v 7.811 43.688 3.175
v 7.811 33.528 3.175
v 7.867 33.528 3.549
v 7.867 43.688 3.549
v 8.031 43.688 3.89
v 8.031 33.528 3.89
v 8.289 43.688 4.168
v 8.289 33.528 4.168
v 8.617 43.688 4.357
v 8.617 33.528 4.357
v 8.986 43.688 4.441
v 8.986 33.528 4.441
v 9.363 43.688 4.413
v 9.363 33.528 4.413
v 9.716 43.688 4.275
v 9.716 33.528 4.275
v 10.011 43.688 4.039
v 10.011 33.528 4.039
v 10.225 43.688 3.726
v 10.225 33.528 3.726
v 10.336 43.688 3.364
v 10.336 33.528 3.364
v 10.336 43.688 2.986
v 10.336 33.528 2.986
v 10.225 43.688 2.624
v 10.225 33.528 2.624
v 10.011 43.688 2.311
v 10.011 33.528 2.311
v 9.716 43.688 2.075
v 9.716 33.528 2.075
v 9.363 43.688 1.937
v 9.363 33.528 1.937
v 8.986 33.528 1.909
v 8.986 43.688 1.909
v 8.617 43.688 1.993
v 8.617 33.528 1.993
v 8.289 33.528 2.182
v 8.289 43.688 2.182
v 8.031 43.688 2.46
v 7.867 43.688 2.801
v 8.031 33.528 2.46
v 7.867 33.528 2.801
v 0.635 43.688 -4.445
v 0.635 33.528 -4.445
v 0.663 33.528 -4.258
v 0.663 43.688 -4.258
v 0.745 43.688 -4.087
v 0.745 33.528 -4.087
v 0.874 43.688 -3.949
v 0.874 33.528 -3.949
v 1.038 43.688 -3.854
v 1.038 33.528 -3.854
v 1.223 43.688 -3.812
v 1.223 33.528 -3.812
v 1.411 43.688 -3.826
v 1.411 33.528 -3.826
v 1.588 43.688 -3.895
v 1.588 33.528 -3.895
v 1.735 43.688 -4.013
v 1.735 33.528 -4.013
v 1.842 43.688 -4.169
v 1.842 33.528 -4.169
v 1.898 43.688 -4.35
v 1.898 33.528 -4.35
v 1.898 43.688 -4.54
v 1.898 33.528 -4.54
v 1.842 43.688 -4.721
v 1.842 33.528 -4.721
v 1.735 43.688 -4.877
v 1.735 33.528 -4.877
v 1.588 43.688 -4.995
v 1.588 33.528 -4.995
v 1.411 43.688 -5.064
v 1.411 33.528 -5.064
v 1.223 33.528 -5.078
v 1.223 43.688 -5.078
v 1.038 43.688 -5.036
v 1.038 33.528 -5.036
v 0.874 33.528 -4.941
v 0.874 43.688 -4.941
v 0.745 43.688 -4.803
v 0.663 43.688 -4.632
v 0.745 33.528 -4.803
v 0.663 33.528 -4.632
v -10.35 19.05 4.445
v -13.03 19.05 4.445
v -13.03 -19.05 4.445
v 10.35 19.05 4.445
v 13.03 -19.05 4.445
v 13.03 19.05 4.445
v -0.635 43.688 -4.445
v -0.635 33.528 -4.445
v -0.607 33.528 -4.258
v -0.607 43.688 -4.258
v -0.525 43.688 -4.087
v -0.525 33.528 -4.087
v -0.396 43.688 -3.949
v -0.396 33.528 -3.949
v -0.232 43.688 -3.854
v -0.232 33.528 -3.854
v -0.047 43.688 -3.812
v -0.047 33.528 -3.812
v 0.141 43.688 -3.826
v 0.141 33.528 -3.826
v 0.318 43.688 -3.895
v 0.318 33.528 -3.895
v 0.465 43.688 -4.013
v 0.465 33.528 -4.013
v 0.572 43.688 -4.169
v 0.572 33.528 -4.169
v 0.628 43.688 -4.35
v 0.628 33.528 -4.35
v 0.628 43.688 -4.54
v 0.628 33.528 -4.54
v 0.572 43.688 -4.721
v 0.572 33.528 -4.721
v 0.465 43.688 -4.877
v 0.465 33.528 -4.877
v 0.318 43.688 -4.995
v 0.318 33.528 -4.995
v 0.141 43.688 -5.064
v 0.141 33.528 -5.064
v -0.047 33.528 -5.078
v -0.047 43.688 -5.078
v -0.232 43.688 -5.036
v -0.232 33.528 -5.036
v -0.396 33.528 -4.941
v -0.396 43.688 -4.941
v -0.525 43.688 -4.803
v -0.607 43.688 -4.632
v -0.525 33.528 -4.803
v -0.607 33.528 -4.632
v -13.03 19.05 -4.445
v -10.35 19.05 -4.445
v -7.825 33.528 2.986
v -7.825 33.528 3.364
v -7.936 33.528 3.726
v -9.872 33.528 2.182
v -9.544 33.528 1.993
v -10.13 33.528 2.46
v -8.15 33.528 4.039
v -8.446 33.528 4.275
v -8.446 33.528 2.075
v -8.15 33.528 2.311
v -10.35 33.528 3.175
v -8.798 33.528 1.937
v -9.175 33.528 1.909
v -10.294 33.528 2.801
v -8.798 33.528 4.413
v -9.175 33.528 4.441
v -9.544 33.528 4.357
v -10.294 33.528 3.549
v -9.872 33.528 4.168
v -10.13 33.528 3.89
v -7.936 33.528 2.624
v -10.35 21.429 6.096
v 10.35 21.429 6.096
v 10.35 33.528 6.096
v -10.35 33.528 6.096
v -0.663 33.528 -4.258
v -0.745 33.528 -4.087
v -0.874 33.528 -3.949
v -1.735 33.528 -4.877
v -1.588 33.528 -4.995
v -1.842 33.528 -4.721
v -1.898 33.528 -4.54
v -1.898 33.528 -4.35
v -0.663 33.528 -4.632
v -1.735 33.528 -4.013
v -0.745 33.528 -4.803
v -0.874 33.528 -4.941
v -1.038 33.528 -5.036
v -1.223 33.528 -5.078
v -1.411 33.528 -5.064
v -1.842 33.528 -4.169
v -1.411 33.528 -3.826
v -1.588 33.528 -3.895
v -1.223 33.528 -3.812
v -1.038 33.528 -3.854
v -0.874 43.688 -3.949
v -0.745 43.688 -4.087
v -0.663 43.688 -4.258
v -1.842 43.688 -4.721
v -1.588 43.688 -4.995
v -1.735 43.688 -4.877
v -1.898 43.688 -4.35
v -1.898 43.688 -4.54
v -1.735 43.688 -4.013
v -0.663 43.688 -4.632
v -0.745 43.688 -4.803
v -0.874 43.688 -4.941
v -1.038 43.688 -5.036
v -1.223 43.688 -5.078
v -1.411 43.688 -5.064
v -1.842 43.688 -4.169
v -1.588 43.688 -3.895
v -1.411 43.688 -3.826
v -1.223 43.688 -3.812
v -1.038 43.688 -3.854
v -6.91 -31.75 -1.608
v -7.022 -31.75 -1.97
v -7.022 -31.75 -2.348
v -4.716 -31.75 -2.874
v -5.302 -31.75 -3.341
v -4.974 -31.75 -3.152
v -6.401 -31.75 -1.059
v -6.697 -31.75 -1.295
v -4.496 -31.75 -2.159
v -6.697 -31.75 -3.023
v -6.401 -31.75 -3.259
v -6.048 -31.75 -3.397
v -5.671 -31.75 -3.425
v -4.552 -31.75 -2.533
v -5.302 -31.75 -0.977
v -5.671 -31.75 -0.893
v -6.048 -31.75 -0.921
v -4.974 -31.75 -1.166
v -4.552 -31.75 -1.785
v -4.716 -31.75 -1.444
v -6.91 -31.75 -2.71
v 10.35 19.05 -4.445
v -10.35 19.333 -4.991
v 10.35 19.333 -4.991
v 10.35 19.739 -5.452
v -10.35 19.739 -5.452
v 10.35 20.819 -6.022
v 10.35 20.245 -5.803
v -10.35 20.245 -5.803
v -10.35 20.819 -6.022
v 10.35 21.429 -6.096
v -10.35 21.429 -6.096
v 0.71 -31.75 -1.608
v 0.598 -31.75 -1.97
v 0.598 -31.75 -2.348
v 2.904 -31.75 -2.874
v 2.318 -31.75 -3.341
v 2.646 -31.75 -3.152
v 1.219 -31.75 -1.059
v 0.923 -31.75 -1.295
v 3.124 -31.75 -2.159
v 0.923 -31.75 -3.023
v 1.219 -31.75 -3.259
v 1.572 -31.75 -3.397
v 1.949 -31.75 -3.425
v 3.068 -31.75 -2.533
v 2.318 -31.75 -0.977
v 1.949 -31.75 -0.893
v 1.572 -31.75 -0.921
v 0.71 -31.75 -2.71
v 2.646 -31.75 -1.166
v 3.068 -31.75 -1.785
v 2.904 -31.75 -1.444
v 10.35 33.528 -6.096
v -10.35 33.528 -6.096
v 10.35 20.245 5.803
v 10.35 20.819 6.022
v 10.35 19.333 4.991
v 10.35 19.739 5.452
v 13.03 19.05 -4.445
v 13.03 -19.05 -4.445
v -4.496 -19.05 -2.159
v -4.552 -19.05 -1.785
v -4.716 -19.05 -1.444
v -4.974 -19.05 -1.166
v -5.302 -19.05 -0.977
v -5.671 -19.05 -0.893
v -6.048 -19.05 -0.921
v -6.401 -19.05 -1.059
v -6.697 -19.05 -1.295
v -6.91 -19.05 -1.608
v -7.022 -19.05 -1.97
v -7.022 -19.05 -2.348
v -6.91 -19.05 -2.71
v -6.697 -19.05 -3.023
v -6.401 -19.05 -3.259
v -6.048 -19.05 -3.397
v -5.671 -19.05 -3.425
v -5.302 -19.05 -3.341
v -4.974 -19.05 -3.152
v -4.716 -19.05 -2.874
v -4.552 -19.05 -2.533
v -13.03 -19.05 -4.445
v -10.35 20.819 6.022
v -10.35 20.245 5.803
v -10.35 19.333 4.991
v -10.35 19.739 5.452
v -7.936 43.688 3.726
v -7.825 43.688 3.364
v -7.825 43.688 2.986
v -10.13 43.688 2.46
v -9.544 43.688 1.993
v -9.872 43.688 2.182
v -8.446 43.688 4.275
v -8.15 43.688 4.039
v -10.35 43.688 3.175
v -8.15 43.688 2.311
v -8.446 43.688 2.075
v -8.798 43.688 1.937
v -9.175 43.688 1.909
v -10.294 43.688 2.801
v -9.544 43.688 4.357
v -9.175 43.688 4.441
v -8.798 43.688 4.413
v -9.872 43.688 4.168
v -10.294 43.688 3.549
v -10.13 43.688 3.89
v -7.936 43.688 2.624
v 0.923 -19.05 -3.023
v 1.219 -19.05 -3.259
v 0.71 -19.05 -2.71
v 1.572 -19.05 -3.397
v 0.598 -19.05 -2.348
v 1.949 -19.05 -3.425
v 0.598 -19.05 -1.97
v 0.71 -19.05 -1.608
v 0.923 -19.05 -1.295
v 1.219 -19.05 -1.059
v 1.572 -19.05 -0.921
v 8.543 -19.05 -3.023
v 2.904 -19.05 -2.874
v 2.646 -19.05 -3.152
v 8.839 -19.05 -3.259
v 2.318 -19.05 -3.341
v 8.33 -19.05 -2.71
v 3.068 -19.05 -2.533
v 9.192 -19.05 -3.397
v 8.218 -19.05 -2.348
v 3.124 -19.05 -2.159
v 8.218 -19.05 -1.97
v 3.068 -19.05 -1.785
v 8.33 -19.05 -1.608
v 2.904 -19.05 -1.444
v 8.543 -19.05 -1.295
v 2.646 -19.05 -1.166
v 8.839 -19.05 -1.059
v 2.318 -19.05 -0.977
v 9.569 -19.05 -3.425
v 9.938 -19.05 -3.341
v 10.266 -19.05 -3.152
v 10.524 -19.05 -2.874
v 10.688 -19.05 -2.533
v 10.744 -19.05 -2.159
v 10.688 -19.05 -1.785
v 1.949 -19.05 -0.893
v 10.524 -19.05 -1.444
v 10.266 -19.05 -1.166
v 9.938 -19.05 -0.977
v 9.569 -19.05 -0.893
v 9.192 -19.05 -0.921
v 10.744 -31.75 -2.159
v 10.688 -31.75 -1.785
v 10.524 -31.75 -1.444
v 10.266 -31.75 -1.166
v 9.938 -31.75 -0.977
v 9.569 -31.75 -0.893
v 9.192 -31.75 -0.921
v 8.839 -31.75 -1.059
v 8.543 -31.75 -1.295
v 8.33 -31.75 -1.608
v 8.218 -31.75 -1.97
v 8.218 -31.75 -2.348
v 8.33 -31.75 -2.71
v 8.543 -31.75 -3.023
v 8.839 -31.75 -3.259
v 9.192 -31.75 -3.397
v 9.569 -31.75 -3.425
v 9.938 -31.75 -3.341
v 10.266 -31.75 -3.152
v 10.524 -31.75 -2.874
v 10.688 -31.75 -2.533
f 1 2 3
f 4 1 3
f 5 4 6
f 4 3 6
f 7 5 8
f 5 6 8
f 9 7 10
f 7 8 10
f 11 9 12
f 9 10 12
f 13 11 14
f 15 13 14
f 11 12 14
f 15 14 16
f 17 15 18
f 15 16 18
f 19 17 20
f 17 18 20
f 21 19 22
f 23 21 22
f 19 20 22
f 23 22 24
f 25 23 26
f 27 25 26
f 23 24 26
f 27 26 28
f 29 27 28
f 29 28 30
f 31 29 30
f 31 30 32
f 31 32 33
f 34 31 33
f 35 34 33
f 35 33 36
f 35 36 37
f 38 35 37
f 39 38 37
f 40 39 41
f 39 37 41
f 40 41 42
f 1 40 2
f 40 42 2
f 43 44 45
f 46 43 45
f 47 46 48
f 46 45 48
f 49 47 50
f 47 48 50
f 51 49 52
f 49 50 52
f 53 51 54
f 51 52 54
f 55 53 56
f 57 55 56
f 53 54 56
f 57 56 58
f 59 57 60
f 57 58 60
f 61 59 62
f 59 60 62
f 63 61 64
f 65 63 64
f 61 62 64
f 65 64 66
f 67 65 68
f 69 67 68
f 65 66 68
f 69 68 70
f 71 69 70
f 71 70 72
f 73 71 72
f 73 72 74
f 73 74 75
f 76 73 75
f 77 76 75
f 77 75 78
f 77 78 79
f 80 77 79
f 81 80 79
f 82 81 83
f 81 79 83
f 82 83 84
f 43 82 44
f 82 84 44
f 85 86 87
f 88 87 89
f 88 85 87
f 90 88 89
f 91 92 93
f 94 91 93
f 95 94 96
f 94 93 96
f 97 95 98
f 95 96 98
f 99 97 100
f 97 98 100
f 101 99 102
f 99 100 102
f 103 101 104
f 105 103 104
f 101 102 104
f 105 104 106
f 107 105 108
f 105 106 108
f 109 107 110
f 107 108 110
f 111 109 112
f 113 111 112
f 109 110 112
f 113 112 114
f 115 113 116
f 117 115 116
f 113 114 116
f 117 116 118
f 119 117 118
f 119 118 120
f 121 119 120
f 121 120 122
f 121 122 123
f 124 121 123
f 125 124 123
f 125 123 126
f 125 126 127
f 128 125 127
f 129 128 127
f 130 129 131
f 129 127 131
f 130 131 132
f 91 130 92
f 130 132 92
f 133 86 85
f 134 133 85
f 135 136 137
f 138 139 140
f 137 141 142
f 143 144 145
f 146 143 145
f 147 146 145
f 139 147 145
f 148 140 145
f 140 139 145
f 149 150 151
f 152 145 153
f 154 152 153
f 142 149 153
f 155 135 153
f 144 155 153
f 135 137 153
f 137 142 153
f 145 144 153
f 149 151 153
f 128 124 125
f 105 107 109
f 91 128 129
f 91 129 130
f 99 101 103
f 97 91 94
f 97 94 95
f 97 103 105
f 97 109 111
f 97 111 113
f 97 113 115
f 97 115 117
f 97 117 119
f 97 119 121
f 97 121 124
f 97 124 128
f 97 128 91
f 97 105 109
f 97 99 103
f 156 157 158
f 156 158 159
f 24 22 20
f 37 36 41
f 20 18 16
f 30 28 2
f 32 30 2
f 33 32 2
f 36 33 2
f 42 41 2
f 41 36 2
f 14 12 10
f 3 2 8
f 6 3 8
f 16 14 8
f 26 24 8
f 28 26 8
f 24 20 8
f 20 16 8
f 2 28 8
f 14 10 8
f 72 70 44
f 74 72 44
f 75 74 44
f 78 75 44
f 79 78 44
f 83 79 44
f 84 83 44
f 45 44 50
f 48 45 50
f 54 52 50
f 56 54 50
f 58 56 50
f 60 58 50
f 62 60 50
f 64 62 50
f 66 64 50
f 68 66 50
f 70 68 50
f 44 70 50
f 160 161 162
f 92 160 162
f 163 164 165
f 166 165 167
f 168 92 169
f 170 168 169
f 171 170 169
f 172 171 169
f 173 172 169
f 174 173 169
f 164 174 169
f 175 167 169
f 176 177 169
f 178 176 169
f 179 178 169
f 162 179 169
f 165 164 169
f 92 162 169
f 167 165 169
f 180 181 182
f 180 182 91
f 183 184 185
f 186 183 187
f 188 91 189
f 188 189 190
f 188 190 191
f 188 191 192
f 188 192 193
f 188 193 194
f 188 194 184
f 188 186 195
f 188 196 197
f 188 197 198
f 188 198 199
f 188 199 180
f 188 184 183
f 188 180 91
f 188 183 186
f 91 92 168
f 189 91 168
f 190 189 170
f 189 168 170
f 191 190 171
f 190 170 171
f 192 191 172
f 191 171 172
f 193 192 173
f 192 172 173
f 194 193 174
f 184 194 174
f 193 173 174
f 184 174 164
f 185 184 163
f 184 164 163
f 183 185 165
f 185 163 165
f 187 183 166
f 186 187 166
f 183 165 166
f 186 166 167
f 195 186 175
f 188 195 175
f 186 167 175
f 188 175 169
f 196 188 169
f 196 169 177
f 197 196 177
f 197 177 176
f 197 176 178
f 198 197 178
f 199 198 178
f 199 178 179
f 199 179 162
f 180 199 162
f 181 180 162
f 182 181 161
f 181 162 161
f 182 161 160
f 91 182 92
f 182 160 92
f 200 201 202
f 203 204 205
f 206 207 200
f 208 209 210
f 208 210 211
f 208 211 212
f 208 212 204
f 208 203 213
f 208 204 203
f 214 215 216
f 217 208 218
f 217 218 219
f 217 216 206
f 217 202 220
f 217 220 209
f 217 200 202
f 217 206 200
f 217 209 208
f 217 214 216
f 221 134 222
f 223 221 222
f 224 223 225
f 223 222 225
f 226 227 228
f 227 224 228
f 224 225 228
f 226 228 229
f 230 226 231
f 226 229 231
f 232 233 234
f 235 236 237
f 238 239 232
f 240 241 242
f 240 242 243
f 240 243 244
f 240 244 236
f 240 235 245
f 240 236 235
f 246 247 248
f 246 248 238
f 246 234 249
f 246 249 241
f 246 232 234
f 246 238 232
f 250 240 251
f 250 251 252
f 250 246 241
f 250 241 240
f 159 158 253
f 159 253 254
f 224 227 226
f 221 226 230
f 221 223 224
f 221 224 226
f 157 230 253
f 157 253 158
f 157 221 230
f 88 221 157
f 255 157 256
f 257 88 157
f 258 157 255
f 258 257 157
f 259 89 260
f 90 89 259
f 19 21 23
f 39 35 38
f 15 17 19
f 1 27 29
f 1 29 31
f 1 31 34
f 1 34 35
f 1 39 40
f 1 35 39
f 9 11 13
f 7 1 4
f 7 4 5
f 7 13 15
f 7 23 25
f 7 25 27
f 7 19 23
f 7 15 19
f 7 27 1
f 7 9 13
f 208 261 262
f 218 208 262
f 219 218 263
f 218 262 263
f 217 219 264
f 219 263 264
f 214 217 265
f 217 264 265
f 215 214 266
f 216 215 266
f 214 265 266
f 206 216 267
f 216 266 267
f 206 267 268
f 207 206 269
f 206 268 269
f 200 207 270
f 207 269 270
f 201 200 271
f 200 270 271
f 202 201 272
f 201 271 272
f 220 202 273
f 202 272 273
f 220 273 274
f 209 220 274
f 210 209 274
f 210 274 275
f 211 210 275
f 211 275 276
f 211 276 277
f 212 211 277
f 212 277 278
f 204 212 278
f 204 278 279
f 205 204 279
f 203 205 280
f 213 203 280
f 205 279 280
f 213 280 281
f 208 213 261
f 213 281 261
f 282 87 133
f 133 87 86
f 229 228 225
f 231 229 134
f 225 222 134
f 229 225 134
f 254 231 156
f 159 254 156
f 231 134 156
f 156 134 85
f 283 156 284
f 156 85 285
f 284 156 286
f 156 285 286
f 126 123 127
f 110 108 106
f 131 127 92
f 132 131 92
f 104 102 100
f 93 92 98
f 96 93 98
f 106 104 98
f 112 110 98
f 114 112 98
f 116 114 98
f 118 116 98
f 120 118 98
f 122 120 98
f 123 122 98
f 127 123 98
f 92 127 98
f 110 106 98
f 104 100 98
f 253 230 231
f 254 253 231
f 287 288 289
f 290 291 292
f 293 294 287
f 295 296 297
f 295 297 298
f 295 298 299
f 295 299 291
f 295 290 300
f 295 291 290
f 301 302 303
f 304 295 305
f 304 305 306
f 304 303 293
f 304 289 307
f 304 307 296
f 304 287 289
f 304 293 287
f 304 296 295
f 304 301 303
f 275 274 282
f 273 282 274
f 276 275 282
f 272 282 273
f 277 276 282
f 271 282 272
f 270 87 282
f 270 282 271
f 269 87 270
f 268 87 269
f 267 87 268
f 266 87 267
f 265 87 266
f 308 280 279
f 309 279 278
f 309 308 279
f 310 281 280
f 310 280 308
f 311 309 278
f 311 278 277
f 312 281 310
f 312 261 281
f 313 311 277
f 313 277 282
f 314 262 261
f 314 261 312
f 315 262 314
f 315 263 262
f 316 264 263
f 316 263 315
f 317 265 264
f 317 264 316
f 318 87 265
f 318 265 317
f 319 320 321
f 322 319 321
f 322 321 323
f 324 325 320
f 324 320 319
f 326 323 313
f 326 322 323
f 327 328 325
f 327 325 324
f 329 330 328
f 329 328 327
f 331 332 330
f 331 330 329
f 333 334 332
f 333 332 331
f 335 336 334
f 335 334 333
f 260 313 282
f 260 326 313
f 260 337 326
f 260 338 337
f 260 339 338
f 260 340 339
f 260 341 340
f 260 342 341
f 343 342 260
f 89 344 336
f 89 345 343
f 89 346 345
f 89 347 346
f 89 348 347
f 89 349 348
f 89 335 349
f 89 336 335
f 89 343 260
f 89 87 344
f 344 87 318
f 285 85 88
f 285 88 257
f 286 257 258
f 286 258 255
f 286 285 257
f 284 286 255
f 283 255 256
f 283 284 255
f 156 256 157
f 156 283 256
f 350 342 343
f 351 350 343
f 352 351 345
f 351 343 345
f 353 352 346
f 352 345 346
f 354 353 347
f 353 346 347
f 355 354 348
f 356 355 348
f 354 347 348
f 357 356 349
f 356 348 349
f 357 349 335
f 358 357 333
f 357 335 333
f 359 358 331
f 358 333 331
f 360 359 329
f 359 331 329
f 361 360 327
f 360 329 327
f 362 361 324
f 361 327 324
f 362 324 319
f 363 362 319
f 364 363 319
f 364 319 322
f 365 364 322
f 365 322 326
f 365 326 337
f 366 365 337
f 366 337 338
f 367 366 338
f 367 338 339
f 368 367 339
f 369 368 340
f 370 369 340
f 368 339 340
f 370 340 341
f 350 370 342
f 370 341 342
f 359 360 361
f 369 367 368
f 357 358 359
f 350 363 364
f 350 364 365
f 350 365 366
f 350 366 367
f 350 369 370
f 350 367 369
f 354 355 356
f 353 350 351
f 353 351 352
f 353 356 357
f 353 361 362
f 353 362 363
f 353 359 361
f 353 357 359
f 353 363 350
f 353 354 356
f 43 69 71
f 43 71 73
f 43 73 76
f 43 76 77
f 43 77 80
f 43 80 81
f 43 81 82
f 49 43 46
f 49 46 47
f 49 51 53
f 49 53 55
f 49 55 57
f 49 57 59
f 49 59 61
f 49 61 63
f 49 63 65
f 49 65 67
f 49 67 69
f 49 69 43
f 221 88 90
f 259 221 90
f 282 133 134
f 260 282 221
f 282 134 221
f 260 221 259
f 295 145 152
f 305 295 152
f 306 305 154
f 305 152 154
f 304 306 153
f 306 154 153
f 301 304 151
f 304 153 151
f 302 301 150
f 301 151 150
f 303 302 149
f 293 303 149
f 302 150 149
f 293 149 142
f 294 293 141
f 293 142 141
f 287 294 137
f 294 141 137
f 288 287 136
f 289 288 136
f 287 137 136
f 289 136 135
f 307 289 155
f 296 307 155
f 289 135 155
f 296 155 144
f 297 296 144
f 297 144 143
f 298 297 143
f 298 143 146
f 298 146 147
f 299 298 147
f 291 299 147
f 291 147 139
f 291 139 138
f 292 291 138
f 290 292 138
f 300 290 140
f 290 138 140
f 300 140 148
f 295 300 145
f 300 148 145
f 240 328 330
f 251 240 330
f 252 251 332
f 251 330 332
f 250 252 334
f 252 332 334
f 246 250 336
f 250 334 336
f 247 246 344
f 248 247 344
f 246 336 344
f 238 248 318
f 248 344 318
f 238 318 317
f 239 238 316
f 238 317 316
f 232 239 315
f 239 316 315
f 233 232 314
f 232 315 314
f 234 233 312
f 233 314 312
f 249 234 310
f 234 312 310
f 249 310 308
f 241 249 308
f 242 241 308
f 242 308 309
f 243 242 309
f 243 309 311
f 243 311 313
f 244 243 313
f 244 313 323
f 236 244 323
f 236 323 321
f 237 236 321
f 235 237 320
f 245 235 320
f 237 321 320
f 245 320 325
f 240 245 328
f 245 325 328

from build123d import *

# Parameters (mm, degrees)
F0_W        = 26.0604
F0_H        = 38.1
F1_DEPTH    = 4.445
F2_R        = 1.27
F3_DEPTH    = 12.7
F4_W        = 20.701
F4_H        = 12.192
F5_DEPTH    = 14.478
F6_R        = 1.27
F7_DEPTH    = 10.16
F6_R_2      = 0.635
F8_T1_DEPTH = 32.5977211869


# Not quite as in the source:
# - a fillet or chamfer that OpenCascade refuses, or shapes differently, is made with other operations: its cross-section is extruded or revolved along the edge and cut away or added


with BuildPart() as f1:
    # F0 (on Top) → F1 (new body, symmetric)
    with BuildSketch(Plane.XY):
        Rectangle(F0_W, F0_H)
    extrude(amount=F1_DEPTH, both=True)

    # F2 (on face) → F3 (join)
    with BuildSketch(Plane.XZ.offset(19.05)):
        with Locations((-5.7658, -2.159)):
            Circle(F2_R)
        with Locations((1.8542, -2.159)):
            Circle(F2_R)
        with Locations((9.4742, -2.159)):
            Circle(F2_R)
    extrude(amount=F3_DEPTH)

    # F4 (on face) → F5 (join)
    with BuildSketch(Plane(origin=(0, 19.05, 0), x_dir=(-1, 0, 0), z_dir=(0, 1, 0))):
        Rectangle(F4_W, F4_H)
    extrude(amount=F5_DEPTH)

    # F8: fillet of radius 2.54 on 2 edges, made by hand

    # F8_s2 → F8_t1 (cut)
    with BuildSketch(Plane.YZ.offset(-16.2988605935)):
        with BuildLine():
            ThreePointArc((19.05, 4.445), (19.9813214475, 5.6428229441), (21.4293442374, 6.096))
            Line((21.4293442374, 6.096), (19.05, 6.096))
            Line((19.05, 6.096), (19.05, 4.445))
        make_face()
        with BuildLine():
            ThreePointArc((19.05, -4.445), (19.9813214475, -5.6428229441), (21.4293442374, -6.096))
            Line((21.4293442374, -6.096), (19.05, -6.096))
            Line((19.05, -6.096), (19.05, -4.445))
        make_face()
    extrude(amount=F8_T1_DEPTH, mode=Mode.SUBTRACT)


with BuildPart() as f7:
    # F6 (on face) → F7 (new body)
    with BuildSketch(Plane(origin=(0, 33.528, 0), x_dir=(-1, 0, 0), z_dir=(0, 1, 0))):
        with Locations((-9.0805, 3.175)):
            Circle(F6_R)
    extrude(amount=F7_DEPTH)


with BuildPart() as f7b:
    # F6 (on face) → F7, piece 2 (new body)
    with BuildSketch(Plane(origin=(0, 33.528, 0), x_dir=(-1, 0, 0), z_dir=(0, 1, 0))):
        with Locations((9.0805, 3.175)):
            Circle(F6_R)
    extrude(amount=F7_DEPTH)


with BuildPart() as f7c:
    # F6 (on face) → F7, piece 3 (new body)
    with BuildSketch(Plane(origin=(0, 33.528, 0), x_dir=(-1, 0, 0), z_dir=(0, 1, 0))):
        with BuildLine():
            ThreePointArc((-0.635, -4.445), (0, -5.08), (0.635, -4.445))
            ThreePointArc((0.635, -4.445), (0, -3.81), (-0.635, -4.445))
        make_face()
    extrude(amount=F7_DEPTH)


with BuildPart() as f7d:
    # F6 (on face) → F7, piece 4 (new body)
    with BuildSketch(Plane(origin=(0, 33.528, 0), x_dir=(-1, 0, 0), z_dir=(0, 1, 0))):
        with Locations((-1.27, -4.445)):
            Circle(F6_R_2)
    extrude(amount=F7_DEPTH)


with BuildPart() as f7e:
    # F6 (on face) → F7, piece 5 (new body)
    with BuildSketch(Plane(origin=(0, 33.528, 0), x_dir=(-1, 0, 0), z_dir=(0, 1, 0))):
        with BuildLine():
            ThreePointArc((1.905, -4.445), (1.27, -3.81), (0.635, -4.445))
            ThreePointArc((0.635, -4.445), (1.27, -5.08), (1.905, -4.445))
        make_face()
    extrude(amount=F7_DEPTH)


solid = Compound([f1.part, f7.part, f7b.part, f7c.part, f7d.part, f7e.part])
